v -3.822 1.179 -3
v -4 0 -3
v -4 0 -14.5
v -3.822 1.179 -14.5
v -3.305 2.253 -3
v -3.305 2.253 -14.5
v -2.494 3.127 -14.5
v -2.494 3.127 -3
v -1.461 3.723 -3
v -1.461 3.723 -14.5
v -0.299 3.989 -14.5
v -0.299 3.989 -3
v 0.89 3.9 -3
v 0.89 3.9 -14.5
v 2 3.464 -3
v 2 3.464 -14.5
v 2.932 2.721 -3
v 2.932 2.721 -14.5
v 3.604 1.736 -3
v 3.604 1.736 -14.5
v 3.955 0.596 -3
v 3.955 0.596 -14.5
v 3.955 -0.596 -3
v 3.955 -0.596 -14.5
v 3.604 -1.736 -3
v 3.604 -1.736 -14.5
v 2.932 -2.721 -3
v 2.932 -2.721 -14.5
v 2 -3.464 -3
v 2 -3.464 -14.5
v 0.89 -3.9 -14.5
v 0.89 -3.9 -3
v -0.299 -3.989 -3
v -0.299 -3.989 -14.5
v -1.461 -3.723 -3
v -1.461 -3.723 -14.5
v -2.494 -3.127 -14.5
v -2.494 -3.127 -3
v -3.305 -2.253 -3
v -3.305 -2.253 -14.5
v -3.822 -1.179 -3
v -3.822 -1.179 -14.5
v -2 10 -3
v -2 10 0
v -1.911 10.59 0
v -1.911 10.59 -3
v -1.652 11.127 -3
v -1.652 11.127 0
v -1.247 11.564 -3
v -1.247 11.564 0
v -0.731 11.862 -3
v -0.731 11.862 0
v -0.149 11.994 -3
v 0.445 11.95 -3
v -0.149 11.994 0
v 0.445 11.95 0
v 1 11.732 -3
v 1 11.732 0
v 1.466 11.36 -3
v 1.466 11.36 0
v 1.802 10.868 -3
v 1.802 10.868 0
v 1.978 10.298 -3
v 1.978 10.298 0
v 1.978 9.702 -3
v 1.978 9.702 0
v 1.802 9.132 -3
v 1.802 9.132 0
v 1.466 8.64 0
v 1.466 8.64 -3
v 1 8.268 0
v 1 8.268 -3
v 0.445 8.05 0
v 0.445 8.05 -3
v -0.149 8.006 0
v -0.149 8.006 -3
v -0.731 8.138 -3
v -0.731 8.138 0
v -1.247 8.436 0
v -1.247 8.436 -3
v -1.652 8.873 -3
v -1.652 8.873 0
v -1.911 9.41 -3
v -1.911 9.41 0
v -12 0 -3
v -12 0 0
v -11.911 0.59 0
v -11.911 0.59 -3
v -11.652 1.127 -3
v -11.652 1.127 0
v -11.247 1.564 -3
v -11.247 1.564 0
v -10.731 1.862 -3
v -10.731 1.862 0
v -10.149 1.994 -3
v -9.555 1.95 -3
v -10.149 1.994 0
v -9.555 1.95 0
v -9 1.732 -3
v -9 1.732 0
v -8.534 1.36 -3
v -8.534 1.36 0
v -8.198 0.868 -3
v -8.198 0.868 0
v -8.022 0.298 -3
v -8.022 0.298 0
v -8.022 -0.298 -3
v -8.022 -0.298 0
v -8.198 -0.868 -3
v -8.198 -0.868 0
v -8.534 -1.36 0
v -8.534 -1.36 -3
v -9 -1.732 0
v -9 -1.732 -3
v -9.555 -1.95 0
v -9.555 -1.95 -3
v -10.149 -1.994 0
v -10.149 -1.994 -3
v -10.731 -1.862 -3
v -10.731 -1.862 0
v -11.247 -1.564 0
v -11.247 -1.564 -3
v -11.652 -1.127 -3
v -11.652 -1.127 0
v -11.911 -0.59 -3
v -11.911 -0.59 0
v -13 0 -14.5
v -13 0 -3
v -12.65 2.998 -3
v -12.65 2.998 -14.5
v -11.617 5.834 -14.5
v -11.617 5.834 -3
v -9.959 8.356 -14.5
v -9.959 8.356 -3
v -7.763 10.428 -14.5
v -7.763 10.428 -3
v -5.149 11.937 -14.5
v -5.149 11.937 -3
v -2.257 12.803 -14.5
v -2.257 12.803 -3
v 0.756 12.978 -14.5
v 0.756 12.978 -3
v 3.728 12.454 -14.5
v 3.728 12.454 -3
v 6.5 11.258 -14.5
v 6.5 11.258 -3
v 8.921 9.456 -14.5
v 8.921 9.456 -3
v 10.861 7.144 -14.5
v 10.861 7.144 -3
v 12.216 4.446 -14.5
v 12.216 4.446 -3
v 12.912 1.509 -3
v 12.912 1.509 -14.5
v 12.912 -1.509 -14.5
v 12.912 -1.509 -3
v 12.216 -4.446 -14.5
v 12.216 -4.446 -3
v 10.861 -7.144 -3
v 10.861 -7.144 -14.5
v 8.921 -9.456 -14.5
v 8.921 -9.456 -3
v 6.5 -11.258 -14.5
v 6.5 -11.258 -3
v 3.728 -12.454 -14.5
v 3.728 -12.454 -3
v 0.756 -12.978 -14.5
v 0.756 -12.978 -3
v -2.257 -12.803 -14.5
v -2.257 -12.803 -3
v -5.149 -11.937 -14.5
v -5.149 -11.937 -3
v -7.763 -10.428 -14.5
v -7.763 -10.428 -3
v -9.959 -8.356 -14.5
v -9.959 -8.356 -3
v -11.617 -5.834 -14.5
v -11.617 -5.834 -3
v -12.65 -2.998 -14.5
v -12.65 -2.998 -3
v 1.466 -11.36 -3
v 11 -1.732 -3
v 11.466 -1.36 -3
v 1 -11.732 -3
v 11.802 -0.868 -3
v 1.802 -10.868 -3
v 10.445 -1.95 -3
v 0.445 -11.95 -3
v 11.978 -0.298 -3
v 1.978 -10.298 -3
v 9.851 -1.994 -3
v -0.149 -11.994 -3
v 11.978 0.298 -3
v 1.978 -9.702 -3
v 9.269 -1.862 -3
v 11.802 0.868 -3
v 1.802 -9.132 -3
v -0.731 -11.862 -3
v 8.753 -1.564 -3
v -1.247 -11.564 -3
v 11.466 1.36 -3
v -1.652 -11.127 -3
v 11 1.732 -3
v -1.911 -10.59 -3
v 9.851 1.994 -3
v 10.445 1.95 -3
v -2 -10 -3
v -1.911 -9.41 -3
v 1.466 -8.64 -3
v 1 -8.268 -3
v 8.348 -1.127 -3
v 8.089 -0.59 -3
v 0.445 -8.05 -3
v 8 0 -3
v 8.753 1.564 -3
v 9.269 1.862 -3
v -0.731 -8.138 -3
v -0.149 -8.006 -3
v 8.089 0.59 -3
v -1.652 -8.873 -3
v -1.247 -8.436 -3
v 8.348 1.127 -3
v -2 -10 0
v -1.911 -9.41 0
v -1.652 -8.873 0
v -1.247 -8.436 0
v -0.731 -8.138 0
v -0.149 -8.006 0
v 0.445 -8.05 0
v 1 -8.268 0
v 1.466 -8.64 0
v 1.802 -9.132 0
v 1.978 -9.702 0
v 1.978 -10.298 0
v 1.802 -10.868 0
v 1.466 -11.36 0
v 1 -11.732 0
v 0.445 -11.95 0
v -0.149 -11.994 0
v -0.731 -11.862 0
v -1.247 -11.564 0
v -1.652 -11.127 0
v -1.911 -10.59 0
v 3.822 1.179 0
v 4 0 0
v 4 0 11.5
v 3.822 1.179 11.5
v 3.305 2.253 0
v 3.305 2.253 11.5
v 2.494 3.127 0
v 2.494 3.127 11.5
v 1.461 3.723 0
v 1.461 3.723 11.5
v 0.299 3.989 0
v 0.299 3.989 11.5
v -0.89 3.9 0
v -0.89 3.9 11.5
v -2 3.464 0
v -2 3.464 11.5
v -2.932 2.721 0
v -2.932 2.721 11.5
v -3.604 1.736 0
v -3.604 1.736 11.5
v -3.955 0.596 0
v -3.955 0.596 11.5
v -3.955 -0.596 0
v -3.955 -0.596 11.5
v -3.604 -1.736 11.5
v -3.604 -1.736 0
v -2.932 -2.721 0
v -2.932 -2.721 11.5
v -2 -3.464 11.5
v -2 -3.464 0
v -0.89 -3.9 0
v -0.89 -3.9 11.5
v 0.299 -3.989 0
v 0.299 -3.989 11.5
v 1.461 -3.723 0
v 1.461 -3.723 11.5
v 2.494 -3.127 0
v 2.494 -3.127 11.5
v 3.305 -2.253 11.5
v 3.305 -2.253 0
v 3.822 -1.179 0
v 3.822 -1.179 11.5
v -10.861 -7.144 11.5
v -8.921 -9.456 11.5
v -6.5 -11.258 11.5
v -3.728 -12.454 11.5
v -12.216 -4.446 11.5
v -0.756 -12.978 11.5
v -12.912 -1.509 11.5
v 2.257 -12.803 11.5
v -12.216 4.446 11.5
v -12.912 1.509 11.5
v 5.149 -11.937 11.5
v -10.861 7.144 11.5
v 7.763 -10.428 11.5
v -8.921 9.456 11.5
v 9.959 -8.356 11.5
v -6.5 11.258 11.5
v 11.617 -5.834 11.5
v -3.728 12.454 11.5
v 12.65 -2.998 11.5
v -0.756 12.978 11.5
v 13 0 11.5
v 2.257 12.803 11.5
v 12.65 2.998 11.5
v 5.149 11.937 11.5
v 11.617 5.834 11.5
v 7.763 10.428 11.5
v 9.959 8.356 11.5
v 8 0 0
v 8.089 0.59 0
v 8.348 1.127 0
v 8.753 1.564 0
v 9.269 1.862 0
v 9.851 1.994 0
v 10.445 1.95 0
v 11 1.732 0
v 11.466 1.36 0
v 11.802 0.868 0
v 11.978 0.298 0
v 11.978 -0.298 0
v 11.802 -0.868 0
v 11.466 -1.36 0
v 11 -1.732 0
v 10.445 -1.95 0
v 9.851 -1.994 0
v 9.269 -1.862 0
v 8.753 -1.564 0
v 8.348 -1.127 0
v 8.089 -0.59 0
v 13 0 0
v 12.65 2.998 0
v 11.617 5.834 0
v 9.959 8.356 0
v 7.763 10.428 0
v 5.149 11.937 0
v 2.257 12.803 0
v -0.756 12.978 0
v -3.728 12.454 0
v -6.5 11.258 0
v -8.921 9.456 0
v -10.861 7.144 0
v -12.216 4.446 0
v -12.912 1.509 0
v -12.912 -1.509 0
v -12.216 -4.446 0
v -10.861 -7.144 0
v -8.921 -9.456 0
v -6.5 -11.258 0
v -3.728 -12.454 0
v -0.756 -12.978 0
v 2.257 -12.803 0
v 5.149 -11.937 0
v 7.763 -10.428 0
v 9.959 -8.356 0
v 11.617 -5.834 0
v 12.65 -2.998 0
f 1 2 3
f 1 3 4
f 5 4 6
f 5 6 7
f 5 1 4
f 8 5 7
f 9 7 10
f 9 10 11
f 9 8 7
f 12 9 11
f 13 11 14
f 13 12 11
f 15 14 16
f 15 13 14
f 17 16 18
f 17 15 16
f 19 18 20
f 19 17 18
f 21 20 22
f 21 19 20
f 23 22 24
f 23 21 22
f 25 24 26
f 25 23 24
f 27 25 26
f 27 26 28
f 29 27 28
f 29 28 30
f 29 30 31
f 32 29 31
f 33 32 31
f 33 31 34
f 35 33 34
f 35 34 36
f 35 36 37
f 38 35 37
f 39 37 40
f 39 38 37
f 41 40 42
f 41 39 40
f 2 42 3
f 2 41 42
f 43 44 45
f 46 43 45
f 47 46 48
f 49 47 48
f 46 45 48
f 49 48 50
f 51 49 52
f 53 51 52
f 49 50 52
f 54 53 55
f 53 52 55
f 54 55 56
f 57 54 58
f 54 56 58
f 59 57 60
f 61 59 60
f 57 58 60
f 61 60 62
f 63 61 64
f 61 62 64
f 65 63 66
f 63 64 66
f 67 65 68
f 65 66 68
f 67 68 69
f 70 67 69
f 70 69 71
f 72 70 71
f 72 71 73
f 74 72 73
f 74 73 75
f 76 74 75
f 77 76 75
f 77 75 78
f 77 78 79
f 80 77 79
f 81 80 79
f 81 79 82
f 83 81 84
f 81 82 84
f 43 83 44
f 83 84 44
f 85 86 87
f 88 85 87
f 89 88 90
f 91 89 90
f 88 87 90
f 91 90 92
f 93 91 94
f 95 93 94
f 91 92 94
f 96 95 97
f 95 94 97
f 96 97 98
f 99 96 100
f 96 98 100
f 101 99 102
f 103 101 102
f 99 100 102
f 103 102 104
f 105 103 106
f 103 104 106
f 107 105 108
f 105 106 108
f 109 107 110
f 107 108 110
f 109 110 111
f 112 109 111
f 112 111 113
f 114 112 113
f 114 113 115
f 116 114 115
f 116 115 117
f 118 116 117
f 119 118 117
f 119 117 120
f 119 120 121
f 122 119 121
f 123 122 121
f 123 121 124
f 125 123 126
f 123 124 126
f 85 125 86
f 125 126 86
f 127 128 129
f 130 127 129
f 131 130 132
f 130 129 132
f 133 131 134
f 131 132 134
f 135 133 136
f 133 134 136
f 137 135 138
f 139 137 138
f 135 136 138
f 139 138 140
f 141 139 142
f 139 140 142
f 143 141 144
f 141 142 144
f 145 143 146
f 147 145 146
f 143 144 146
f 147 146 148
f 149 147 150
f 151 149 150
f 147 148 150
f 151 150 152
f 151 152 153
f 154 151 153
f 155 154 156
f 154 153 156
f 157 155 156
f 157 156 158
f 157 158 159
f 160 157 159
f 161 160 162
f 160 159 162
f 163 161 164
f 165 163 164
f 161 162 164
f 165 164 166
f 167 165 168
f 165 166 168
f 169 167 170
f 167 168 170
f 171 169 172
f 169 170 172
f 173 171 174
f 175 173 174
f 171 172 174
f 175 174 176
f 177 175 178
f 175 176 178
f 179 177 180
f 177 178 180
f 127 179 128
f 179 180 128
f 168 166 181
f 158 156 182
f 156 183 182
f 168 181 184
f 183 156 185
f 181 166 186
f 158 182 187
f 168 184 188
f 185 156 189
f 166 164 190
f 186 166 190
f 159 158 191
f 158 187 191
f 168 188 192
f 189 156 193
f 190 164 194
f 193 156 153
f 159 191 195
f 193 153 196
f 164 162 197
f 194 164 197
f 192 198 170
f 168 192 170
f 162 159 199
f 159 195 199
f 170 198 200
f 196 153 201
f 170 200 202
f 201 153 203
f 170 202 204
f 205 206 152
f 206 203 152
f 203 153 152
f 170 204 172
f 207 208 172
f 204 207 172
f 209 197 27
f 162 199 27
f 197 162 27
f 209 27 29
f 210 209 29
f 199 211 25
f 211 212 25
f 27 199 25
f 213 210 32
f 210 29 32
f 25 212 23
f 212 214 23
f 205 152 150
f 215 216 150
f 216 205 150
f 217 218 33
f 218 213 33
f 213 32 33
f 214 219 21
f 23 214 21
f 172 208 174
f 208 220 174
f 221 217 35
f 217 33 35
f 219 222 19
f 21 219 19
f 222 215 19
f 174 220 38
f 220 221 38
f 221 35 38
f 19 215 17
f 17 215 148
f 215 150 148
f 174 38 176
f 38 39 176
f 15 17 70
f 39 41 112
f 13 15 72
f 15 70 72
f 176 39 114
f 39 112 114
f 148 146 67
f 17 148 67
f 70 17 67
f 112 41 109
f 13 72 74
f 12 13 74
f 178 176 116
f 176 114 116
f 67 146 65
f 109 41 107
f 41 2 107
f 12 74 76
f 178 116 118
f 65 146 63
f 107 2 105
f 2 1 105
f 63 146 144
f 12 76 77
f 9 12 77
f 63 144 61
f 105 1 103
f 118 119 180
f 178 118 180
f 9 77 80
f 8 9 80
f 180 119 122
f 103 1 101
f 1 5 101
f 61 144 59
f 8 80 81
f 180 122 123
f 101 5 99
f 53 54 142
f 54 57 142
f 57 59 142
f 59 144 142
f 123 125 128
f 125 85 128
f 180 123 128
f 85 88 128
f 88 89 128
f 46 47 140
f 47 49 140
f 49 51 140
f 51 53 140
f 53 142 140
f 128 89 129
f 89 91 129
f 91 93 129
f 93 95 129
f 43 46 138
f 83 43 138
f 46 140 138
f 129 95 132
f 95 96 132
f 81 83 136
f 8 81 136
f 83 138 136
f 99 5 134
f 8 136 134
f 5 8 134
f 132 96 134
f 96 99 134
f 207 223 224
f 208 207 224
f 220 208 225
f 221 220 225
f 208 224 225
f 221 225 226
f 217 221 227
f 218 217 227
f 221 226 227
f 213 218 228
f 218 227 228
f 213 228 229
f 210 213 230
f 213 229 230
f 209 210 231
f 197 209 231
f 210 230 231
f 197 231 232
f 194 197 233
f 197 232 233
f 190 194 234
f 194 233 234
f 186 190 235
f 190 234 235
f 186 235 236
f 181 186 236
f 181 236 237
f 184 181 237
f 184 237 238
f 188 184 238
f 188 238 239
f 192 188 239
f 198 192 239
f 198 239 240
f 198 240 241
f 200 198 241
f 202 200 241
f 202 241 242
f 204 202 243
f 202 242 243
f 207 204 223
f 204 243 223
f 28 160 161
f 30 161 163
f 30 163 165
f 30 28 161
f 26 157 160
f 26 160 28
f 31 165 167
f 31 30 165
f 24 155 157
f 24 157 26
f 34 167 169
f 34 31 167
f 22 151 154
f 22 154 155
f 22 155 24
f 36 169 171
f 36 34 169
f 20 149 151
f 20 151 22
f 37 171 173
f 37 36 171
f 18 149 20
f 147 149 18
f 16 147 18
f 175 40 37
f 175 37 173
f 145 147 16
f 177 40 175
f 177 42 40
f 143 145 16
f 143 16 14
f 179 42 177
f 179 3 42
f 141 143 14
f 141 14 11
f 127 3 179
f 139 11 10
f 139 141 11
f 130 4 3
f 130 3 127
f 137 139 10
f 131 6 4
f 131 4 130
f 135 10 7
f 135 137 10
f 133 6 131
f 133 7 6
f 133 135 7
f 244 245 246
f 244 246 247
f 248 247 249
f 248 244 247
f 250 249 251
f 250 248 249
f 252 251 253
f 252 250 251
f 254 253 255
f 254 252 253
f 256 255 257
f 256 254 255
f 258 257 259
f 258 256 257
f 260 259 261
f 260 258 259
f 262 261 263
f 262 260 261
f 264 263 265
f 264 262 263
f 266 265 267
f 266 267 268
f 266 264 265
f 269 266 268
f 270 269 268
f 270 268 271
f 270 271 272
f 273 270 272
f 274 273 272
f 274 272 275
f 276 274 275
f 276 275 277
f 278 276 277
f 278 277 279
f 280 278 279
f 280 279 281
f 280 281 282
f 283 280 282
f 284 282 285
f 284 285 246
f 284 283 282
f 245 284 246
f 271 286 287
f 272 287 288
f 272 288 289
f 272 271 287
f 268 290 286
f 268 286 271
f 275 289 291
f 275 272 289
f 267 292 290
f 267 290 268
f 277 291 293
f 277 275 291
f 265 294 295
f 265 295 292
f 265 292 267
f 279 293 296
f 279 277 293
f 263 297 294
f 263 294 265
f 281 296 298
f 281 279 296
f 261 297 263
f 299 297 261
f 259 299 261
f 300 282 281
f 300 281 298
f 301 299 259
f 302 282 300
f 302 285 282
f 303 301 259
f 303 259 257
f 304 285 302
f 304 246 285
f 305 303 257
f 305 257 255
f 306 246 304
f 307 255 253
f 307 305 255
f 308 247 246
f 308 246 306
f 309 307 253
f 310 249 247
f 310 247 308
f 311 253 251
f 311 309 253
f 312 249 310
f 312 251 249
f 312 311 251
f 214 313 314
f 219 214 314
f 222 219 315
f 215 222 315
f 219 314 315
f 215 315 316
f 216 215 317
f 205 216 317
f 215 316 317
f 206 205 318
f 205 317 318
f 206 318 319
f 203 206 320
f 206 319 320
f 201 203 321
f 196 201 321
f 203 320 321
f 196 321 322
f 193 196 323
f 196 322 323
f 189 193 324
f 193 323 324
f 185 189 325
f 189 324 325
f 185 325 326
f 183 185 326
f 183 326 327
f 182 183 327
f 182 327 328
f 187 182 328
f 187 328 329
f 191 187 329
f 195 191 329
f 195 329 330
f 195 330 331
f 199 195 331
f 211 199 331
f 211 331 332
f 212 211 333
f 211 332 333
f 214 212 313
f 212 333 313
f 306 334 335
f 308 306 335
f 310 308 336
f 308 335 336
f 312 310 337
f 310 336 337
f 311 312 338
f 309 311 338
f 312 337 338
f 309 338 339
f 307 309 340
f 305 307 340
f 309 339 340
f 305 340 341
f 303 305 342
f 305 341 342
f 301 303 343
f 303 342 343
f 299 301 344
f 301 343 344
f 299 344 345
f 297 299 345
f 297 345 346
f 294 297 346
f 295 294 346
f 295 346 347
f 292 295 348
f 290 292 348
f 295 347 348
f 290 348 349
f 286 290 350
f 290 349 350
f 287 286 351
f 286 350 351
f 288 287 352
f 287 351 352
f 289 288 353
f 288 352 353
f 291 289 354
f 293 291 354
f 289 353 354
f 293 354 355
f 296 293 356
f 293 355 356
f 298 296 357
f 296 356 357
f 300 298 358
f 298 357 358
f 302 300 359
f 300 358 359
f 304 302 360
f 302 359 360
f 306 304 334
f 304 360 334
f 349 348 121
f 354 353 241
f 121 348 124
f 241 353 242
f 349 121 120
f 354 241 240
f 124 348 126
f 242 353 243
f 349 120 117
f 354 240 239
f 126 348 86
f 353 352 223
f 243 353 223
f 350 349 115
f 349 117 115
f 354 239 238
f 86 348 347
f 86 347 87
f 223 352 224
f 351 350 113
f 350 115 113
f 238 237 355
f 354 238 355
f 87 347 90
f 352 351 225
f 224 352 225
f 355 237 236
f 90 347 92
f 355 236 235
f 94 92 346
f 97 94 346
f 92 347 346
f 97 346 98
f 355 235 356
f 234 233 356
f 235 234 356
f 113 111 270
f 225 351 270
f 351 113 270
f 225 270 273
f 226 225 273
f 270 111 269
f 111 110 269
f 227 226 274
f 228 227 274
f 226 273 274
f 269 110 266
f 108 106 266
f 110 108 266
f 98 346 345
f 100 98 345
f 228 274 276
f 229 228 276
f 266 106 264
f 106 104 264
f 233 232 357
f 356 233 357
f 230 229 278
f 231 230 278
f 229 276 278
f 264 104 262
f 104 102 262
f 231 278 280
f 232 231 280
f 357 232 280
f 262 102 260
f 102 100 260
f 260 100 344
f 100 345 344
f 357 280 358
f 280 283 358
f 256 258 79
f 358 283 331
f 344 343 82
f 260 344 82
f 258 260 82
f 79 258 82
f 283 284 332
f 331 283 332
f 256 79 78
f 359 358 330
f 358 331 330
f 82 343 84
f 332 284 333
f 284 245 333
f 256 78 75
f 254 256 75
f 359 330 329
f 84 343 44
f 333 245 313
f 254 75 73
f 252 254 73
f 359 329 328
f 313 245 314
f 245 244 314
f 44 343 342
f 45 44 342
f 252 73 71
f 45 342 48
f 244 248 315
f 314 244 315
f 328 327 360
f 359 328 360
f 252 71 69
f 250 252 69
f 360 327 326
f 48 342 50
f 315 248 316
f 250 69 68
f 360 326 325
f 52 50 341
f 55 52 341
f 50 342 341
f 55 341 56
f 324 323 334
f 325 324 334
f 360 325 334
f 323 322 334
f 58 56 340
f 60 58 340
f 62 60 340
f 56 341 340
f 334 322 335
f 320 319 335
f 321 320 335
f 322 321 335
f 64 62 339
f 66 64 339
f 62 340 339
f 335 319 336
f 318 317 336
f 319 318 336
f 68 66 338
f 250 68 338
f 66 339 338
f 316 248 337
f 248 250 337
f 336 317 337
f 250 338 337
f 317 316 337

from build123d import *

# Parameters (mm, degrees)
SKETCH1_R           = 13
SKETCH1_R_2         = 4
BOSS_EXTRUDE1_DEPTH = 11.5
SKETCH2_R           = 2
BOSS_EXTRUDE2_DEPTH = 3
SKETCH3_R           = 13
SKETCH3_R_2         = 4
BOSS_EXTRUDE3_DEPTH = 11.5


with BuildPart() as part:
    # Sketch1 → Boss-Extrude1 (new body)
    with BuildSketch(Plane.XY):
        Circle(SKETCH1_R)
        Circle(SKETCH1_R_2, mode=Mode.SUBTRACT)
    extrude(amount=BOSS_EXTRUDE1_DEPTH)

    # Sketch2 → Boss-Extrude2 (add)
    with BuildSketch(Plane(origin=(0, 0, 0), x_dir=(-1, 0, 0), z_dir=(0, 0, -1))):
        with Locations((0, 10)):
            Circle(SKETCH2_R)
        with Locations((10, 0)):
            Circle(SKETCH2_R)
        with Locations((0, -10)):
            Circle(SKETCH2_R)
        with Locations((-10, 0)):
            Circle(SKETCH2_R)
    extrude(amount=BOSS_EXTRUDE2_DEPTH)

    # Sketch3 → Boss-Extrude3 (add)
    with BuildSketch(Plane(origin=(0, 0, -3), x_dir=(-1, 0, 0), z_dir=(0, 0, -1))):
        Circle(SKETCH3_R)
        Circle(SKETCH3_R_2, mode=Mode.SUBTRACT)
    extrude(amount=BOSS_EXTRUDE3_DEPTH)


solid = part.part
